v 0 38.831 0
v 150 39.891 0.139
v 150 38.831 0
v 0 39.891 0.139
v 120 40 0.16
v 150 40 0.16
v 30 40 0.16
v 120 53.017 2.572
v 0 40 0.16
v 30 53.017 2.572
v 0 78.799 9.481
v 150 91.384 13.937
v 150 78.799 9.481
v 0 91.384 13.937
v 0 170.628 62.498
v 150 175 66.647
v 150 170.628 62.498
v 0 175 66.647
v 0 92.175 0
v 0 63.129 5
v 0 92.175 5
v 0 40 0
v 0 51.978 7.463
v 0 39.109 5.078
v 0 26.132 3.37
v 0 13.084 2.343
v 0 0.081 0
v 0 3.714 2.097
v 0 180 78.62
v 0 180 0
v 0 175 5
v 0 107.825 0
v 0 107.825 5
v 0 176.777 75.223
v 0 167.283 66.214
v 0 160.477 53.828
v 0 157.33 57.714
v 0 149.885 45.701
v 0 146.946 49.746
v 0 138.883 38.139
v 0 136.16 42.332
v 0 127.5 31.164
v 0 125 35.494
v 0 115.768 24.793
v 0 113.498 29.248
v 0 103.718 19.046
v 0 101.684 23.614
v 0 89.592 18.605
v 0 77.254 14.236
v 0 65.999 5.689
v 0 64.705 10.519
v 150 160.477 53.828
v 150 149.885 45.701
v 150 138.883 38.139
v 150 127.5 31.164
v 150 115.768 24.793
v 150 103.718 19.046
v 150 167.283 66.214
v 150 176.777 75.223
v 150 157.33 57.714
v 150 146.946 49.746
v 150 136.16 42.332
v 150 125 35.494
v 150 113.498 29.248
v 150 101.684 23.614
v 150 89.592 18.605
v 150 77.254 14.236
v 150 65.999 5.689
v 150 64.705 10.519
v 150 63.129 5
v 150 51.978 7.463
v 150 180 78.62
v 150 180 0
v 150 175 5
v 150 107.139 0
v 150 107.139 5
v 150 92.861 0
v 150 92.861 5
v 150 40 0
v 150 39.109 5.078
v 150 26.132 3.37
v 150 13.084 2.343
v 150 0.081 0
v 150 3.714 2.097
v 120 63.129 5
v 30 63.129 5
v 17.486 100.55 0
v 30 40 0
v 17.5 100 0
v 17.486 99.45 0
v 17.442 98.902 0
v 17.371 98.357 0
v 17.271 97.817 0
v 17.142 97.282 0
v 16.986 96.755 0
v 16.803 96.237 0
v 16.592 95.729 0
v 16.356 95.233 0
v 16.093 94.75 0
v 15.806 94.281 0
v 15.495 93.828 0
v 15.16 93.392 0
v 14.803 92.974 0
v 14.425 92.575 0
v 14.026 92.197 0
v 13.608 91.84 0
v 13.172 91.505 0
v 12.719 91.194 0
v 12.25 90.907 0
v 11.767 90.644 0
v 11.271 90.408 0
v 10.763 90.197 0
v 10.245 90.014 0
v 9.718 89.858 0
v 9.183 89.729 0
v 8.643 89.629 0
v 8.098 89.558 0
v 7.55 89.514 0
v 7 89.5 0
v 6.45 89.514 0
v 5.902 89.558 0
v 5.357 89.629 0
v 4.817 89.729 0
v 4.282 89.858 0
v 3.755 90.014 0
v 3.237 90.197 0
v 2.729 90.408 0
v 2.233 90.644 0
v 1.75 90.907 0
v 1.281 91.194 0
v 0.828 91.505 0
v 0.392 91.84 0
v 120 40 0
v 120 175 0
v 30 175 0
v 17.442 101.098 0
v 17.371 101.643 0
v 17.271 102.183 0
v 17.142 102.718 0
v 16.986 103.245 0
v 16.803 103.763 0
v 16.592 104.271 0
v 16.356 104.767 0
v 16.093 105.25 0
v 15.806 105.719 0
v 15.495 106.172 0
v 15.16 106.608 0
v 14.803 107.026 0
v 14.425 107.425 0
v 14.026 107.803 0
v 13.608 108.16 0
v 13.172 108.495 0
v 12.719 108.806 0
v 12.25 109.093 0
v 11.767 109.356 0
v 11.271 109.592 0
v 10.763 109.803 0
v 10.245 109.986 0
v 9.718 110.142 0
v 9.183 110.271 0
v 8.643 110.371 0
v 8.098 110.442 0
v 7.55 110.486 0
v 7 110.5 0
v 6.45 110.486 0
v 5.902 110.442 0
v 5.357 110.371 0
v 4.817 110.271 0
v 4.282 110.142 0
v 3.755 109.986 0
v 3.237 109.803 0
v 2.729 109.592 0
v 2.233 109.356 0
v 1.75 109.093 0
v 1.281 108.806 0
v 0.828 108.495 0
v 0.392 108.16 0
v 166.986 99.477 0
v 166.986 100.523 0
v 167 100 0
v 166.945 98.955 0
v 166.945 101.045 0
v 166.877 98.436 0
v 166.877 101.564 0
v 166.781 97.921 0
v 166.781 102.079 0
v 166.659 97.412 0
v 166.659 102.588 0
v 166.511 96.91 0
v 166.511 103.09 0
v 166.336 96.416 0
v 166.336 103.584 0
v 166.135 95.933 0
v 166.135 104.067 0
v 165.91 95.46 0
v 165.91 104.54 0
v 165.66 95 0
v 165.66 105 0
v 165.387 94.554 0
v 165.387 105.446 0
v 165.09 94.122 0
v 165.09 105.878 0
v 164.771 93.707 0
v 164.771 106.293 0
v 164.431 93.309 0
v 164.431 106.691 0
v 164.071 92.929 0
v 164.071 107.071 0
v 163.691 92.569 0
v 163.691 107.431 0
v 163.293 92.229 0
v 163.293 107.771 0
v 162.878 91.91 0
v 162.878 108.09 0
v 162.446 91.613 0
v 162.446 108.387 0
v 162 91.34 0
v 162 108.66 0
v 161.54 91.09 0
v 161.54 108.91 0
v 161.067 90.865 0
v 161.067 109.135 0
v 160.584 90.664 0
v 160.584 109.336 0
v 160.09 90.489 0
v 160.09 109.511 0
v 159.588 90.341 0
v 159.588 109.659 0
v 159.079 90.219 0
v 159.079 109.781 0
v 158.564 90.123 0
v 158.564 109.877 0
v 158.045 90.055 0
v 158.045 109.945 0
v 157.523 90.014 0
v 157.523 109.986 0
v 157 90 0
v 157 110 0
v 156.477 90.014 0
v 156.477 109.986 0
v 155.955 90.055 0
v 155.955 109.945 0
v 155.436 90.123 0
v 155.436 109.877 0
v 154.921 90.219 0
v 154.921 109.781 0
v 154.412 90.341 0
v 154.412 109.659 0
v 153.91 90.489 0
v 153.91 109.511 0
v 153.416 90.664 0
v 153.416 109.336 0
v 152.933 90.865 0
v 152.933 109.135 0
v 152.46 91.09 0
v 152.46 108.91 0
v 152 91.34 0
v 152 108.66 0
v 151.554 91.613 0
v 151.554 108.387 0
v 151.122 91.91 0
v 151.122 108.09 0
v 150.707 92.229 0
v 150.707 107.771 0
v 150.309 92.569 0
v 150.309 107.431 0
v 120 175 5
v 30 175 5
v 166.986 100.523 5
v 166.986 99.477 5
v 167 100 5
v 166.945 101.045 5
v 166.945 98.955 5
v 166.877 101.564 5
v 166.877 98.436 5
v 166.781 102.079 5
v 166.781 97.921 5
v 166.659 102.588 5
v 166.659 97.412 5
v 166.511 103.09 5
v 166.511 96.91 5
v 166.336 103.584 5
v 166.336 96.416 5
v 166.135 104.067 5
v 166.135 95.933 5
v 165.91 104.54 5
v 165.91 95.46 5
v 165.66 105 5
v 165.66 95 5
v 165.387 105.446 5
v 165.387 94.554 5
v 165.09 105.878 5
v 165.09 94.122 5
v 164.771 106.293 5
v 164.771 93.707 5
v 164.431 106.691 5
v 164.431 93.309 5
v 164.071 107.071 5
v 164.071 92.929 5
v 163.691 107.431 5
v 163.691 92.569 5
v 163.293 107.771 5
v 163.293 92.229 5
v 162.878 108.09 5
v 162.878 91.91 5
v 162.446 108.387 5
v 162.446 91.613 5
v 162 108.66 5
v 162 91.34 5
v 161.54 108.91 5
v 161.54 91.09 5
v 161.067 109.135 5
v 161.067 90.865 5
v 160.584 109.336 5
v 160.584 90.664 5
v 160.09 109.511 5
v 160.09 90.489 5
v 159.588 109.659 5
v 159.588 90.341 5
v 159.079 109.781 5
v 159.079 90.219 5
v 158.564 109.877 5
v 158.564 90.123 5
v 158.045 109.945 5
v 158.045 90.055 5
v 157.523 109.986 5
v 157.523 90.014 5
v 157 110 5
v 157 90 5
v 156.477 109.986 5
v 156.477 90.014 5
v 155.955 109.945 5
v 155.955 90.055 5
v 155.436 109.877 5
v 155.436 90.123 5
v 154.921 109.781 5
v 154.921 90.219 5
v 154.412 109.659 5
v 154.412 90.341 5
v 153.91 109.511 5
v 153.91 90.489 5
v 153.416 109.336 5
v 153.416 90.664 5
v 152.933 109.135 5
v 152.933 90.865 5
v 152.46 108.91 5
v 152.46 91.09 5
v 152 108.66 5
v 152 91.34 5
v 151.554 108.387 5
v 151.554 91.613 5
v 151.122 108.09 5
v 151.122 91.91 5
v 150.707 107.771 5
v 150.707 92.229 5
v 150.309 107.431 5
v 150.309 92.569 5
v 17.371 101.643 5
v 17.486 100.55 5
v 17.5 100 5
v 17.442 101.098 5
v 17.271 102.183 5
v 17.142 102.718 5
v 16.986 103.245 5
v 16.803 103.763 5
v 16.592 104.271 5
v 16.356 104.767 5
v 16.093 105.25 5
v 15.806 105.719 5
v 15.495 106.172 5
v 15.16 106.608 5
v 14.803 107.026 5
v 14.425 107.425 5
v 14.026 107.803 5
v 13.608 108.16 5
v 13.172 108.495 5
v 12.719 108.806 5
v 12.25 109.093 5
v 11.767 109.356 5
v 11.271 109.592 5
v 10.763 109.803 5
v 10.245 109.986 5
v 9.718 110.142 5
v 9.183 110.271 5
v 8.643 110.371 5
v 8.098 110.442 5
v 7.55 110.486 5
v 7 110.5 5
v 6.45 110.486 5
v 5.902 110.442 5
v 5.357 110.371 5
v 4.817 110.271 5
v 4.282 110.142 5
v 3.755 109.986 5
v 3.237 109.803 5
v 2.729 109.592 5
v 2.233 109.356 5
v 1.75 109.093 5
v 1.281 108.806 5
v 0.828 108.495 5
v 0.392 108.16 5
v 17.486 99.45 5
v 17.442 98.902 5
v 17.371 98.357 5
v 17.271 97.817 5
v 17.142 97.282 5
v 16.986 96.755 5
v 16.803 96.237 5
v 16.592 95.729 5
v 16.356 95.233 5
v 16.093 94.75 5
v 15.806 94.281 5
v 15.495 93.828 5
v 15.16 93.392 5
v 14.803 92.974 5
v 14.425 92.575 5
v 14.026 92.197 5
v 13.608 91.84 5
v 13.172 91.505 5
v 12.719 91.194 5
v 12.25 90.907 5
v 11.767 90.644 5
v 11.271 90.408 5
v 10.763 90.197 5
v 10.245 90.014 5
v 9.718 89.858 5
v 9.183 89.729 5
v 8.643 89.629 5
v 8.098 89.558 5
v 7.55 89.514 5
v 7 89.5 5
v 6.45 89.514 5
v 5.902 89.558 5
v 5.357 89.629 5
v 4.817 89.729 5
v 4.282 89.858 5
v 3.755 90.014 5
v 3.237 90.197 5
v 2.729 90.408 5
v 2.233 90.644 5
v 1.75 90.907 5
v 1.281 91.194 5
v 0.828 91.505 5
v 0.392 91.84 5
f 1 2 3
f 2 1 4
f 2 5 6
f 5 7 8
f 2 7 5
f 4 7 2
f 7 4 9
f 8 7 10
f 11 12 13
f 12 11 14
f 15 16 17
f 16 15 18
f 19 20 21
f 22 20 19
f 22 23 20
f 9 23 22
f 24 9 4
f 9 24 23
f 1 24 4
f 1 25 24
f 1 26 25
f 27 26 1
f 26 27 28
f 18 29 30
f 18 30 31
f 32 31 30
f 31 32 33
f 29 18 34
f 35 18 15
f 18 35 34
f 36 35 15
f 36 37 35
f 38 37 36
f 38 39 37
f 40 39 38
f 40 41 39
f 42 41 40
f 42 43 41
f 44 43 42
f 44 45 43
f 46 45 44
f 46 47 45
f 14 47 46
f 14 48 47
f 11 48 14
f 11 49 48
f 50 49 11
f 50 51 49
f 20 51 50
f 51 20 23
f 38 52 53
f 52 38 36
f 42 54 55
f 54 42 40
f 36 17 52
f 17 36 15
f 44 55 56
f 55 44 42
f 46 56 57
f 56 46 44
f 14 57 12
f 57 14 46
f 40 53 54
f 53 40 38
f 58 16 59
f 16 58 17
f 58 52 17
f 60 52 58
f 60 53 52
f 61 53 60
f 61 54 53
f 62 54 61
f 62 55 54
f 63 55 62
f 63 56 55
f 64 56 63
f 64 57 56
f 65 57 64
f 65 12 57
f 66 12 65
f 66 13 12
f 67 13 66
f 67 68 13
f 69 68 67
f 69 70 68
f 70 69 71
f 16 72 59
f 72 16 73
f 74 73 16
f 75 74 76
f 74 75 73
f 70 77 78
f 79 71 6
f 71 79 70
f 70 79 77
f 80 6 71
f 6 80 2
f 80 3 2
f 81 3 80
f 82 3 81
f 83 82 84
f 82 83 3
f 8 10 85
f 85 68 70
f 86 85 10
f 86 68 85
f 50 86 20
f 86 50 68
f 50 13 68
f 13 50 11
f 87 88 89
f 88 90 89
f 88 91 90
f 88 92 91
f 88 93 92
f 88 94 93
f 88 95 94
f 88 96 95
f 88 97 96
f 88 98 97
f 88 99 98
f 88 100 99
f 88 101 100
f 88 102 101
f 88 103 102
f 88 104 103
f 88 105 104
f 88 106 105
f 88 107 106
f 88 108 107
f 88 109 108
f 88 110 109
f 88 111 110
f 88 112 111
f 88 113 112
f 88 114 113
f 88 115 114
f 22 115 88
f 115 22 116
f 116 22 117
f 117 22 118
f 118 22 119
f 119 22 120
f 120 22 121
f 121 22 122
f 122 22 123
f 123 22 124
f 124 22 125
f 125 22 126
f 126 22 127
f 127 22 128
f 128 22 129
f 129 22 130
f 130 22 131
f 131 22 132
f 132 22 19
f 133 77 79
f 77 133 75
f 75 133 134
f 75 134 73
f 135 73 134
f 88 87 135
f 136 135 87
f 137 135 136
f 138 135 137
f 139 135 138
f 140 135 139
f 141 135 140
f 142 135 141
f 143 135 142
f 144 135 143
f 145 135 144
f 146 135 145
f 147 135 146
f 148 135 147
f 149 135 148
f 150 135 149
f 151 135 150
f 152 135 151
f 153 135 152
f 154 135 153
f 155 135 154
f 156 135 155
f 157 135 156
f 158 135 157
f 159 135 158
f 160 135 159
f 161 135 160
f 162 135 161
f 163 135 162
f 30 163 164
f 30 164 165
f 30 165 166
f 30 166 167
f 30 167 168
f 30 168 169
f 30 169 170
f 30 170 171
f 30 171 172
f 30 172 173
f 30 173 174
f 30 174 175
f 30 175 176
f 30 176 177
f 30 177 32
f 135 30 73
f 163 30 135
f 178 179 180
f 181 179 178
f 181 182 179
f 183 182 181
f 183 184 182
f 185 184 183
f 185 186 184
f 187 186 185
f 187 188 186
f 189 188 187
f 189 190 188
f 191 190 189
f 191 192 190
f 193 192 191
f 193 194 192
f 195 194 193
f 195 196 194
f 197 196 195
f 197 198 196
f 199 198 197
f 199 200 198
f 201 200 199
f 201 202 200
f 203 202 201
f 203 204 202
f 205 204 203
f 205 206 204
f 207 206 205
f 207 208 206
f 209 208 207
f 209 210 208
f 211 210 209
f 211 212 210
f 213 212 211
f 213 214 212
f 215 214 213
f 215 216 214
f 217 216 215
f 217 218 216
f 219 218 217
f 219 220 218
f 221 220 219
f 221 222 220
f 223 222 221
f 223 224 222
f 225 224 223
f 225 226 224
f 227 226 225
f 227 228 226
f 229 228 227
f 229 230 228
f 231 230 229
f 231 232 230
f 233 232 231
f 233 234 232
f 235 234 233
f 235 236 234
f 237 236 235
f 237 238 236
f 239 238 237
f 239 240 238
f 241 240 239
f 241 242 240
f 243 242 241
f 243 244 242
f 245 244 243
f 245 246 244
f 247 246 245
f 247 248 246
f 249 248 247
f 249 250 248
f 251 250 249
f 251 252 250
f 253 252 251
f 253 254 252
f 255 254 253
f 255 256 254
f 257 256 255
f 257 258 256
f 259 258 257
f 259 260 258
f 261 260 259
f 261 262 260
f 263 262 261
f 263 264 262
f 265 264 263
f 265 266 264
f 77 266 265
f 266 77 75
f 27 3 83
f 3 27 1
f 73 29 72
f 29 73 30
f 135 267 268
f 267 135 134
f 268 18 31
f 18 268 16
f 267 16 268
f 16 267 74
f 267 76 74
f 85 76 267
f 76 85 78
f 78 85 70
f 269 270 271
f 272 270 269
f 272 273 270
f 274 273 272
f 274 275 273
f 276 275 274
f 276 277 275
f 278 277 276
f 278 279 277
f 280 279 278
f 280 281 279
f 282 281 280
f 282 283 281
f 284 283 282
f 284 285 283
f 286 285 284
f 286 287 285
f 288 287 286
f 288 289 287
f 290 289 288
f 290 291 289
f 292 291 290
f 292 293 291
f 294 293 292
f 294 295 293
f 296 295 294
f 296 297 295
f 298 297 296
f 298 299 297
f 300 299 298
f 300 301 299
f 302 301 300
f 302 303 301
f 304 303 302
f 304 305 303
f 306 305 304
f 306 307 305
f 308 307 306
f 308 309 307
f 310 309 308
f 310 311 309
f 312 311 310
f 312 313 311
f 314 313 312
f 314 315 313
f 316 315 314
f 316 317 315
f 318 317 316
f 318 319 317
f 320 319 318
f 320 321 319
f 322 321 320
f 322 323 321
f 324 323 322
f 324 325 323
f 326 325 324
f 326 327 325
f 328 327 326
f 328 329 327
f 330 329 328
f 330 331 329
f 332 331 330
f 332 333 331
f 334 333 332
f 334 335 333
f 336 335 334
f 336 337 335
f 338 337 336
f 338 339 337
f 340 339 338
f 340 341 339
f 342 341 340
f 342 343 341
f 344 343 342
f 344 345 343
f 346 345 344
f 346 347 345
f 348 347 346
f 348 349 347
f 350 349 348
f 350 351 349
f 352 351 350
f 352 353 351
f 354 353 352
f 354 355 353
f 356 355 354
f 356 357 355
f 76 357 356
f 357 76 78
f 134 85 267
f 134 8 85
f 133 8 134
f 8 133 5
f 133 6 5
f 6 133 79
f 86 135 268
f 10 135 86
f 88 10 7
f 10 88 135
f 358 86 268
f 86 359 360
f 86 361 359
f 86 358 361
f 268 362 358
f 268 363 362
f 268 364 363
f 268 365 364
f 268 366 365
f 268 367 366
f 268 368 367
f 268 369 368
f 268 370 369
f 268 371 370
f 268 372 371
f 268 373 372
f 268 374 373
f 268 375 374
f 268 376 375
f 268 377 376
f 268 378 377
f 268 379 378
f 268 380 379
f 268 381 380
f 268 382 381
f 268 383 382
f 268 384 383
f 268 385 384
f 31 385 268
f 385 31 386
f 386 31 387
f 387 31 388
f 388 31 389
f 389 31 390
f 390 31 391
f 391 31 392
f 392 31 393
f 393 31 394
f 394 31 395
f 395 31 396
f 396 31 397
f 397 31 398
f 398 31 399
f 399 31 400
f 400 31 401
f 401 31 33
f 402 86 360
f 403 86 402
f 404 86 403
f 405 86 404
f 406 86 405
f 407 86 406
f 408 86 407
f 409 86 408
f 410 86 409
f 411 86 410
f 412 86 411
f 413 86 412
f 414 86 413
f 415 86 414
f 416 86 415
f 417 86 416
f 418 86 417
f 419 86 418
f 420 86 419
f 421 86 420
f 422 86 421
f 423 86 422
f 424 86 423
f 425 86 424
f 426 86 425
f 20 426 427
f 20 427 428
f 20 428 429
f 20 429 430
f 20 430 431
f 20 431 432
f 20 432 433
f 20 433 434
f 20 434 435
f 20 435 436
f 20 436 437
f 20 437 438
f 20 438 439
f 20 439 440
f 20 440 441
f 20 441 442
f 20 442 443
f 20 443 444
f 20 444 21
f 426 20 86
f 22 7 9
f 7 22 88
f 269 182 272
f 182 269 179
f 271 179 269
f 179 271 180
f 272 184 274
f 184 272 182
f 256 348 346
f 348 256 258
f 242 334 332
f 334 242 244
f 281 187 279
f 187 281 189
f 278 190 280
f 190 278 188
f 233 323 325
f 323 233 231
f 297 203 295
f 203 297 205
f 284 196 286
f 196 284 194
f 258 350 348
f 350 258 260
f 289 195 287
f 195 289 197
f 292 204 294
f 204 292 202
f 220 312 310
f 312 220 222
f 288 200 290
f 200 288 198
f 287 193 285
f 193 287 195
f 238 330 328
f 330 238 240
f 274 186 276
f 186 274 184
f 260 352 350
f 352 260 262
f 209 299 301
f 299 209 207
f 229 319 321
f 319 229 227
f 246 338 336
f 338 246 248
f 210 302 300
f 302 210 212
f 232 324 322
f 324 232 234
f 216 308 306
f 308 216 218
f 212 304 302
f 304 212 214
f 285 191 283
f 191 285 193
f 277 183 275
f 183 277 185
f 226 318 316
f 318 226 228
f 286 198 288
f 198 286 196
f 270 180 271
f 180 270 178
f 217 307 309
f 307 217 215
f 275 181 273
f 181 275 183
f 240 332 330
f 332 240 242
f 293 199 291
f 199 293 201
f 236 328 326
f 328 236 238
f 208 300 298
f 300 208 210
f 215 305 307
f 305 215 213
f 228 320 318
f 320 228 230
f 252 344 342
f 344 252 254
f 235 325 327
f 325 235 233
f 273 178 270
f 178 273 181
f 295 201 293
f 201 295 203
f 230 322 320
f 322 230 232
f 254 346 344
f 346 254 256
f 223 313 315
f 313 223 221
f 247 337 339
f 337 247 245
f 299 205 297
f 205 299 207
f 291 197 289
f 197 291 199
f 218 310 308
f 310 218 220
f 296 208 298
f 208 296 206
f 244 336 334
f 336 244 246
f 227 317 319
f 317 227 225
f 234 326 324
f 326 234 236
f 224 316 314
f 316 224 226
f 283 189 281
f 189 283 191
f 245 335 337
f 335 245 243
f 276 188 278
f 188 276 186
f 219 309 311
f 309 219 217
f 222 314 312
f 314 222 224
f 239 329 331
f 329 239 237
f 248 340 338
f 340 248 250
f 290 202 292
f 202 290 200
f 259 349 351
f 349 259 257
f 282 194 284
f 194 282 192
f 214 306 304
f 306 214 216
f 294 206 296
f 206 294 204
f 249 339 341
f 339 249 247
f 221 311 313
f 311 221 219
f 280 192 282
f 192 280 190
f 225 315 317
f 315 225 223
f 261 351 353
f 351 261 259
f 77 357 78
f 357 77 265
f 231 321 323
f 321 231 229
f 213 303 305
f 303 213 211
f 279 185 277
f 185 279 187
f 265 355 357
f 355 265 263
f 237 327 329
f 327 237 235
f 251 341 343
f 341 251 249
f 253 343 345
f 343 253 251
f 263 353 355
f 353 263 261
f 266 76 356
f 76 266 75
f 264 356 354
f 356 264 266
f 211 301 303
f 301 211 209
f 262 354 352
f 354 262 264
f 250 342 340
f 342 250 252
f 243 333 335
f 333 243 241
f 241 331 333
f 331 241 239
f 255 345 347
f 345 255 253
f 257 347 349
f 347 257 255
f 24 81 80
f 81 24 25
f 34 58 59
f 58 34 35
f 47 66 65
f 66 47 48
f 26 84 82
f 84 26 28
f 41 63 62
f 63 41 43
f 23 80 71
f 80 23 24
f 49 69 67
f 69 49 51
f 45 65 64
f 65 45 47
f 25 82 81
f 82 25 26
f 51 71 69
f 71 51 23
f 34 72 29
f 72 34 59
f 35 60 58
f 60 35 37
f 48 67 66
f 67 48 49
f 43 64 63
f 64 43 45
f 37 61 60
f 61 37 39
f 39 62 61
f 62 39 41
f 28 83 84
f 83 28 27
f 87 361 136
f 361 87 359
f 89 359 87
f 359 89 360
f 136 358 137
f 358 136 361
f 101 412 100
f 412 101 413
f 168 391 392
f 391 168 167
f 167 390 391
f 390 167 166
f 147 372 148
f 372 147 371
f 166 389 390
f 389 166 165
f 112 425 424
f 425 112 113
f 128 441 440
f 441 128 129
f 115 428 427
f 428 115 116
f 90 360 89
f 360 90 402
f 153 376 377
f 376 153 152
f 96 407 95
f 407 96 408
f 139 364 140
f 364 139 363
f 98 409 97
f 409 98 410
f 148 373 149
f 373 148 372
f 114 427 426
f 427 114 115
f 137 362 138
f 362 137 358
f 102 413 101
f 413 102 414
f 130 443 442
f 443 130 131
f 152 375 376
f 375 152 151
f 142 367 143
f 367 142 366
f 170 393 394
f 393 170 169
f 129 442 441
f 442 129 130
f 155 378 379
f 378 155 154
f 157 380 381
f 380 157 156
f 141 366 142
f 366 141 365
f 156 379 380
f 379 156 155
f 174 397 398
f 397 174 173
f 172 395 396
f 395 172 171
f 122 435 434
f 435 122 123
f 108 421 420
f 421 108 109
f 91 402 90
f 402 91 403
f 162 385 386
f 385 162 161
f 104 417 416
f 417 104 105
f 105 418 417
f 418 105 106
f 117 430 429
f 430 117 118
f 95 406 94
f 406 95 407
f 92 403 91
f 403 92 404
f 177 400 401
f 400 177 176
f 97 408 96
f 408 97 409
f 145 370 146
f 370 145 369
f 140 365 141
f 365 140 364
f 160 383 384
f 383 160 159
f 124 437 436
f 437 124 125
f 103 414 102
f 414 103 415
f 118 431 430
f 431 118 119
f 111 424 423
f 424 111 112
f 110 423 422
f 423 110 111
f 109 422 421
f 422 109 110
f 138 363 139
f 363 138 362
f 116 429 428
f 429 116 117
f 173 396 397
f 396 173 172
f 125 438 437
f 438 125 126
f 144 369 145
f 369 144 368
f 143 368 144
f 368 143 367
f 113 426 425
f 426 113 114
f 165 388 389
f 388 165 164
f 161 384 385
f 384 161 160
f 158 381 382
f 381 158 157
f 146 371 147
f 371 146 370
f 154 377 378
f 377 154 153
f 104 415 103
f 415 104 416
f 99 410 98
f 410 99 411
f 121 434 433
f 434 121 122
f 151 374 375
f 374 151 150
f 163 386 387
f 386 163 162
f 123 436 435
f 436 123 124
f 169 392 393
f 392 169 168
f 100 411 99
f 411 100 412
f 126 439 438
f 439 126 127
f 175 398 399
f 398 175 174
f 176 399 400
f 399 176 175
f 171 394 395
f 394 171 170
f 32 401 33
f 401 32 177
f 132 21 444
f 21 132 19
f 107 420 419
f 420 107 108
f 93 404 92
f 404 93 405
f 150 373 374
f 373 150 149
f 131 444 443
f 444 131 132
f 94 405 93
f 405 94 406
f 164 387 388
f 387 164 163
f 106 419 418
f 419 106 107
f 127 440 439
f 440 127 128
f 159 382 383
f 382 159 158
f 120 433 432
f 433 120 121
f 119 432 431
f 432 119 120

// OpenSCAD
$fn=120;

r=25; //Radius Rampe
wandhoch=50; //Höhe der Rückwand, wird automatisch abgeschnitten
h=15; //Breite Rampe
ymax=18; //Größe in y-Richtung
wand=0.5; //Wandstärke überall
scale([10,10,10]) difference() {
    
    union() {
        //Rampe Unterfläche
        translate([h/2,0,r+.2]) rotate([0,90,0]) cylinder(r=r+wand,h=h,center=true);
        
        //Rückwand
        translate([h/2,ymax-wand/2,wandhoch/2]) cube([h,wand,wandhoch],center=true);
        
        //Boden rechts
        translate([h-3/2,ymax/2+4/2,wand/2]) cube([3,ymax-4,wand],center=true);
        
        //Boden links
        translate([3/2,ymax/2+4/2,wand/2]) cube([3,ymax-4,wand],center=true);
        
        //Seiteneinraster
        translate([h+0.7,10,wand/2]) cylinder(r=1,h=wand,center=true);
    }
    //Rampe Oberfläche
    translate([h/2,0,r+.2]) rotate([0,90,0]) cylinder(r=r,h=h+1,center=true);
    //ymax abschneiden
    translate([0,200+ymax,0]) cube([400,400,400],center=true);
    //ymin abschneiden
    translate([0,-200,0]) cube([400,400,400],center=true);
    //zmax abschneiden
    translate([0,0,200+20]) cube([400,400,400],center=true);
    //zmin abschneiden
    translate([0,0,-200]) cube([400,400,400],center=true);
    //Kante vorne abschneiden
    translate([0,0,+1.15]) rotate([30,0,0]) cube([400,2,2],center=true);
    //Seiteneinrasterloch
    translate([0.7,10,wand/2]) cylinder(r=1.05,h=wand+0.2,center=true);
}
